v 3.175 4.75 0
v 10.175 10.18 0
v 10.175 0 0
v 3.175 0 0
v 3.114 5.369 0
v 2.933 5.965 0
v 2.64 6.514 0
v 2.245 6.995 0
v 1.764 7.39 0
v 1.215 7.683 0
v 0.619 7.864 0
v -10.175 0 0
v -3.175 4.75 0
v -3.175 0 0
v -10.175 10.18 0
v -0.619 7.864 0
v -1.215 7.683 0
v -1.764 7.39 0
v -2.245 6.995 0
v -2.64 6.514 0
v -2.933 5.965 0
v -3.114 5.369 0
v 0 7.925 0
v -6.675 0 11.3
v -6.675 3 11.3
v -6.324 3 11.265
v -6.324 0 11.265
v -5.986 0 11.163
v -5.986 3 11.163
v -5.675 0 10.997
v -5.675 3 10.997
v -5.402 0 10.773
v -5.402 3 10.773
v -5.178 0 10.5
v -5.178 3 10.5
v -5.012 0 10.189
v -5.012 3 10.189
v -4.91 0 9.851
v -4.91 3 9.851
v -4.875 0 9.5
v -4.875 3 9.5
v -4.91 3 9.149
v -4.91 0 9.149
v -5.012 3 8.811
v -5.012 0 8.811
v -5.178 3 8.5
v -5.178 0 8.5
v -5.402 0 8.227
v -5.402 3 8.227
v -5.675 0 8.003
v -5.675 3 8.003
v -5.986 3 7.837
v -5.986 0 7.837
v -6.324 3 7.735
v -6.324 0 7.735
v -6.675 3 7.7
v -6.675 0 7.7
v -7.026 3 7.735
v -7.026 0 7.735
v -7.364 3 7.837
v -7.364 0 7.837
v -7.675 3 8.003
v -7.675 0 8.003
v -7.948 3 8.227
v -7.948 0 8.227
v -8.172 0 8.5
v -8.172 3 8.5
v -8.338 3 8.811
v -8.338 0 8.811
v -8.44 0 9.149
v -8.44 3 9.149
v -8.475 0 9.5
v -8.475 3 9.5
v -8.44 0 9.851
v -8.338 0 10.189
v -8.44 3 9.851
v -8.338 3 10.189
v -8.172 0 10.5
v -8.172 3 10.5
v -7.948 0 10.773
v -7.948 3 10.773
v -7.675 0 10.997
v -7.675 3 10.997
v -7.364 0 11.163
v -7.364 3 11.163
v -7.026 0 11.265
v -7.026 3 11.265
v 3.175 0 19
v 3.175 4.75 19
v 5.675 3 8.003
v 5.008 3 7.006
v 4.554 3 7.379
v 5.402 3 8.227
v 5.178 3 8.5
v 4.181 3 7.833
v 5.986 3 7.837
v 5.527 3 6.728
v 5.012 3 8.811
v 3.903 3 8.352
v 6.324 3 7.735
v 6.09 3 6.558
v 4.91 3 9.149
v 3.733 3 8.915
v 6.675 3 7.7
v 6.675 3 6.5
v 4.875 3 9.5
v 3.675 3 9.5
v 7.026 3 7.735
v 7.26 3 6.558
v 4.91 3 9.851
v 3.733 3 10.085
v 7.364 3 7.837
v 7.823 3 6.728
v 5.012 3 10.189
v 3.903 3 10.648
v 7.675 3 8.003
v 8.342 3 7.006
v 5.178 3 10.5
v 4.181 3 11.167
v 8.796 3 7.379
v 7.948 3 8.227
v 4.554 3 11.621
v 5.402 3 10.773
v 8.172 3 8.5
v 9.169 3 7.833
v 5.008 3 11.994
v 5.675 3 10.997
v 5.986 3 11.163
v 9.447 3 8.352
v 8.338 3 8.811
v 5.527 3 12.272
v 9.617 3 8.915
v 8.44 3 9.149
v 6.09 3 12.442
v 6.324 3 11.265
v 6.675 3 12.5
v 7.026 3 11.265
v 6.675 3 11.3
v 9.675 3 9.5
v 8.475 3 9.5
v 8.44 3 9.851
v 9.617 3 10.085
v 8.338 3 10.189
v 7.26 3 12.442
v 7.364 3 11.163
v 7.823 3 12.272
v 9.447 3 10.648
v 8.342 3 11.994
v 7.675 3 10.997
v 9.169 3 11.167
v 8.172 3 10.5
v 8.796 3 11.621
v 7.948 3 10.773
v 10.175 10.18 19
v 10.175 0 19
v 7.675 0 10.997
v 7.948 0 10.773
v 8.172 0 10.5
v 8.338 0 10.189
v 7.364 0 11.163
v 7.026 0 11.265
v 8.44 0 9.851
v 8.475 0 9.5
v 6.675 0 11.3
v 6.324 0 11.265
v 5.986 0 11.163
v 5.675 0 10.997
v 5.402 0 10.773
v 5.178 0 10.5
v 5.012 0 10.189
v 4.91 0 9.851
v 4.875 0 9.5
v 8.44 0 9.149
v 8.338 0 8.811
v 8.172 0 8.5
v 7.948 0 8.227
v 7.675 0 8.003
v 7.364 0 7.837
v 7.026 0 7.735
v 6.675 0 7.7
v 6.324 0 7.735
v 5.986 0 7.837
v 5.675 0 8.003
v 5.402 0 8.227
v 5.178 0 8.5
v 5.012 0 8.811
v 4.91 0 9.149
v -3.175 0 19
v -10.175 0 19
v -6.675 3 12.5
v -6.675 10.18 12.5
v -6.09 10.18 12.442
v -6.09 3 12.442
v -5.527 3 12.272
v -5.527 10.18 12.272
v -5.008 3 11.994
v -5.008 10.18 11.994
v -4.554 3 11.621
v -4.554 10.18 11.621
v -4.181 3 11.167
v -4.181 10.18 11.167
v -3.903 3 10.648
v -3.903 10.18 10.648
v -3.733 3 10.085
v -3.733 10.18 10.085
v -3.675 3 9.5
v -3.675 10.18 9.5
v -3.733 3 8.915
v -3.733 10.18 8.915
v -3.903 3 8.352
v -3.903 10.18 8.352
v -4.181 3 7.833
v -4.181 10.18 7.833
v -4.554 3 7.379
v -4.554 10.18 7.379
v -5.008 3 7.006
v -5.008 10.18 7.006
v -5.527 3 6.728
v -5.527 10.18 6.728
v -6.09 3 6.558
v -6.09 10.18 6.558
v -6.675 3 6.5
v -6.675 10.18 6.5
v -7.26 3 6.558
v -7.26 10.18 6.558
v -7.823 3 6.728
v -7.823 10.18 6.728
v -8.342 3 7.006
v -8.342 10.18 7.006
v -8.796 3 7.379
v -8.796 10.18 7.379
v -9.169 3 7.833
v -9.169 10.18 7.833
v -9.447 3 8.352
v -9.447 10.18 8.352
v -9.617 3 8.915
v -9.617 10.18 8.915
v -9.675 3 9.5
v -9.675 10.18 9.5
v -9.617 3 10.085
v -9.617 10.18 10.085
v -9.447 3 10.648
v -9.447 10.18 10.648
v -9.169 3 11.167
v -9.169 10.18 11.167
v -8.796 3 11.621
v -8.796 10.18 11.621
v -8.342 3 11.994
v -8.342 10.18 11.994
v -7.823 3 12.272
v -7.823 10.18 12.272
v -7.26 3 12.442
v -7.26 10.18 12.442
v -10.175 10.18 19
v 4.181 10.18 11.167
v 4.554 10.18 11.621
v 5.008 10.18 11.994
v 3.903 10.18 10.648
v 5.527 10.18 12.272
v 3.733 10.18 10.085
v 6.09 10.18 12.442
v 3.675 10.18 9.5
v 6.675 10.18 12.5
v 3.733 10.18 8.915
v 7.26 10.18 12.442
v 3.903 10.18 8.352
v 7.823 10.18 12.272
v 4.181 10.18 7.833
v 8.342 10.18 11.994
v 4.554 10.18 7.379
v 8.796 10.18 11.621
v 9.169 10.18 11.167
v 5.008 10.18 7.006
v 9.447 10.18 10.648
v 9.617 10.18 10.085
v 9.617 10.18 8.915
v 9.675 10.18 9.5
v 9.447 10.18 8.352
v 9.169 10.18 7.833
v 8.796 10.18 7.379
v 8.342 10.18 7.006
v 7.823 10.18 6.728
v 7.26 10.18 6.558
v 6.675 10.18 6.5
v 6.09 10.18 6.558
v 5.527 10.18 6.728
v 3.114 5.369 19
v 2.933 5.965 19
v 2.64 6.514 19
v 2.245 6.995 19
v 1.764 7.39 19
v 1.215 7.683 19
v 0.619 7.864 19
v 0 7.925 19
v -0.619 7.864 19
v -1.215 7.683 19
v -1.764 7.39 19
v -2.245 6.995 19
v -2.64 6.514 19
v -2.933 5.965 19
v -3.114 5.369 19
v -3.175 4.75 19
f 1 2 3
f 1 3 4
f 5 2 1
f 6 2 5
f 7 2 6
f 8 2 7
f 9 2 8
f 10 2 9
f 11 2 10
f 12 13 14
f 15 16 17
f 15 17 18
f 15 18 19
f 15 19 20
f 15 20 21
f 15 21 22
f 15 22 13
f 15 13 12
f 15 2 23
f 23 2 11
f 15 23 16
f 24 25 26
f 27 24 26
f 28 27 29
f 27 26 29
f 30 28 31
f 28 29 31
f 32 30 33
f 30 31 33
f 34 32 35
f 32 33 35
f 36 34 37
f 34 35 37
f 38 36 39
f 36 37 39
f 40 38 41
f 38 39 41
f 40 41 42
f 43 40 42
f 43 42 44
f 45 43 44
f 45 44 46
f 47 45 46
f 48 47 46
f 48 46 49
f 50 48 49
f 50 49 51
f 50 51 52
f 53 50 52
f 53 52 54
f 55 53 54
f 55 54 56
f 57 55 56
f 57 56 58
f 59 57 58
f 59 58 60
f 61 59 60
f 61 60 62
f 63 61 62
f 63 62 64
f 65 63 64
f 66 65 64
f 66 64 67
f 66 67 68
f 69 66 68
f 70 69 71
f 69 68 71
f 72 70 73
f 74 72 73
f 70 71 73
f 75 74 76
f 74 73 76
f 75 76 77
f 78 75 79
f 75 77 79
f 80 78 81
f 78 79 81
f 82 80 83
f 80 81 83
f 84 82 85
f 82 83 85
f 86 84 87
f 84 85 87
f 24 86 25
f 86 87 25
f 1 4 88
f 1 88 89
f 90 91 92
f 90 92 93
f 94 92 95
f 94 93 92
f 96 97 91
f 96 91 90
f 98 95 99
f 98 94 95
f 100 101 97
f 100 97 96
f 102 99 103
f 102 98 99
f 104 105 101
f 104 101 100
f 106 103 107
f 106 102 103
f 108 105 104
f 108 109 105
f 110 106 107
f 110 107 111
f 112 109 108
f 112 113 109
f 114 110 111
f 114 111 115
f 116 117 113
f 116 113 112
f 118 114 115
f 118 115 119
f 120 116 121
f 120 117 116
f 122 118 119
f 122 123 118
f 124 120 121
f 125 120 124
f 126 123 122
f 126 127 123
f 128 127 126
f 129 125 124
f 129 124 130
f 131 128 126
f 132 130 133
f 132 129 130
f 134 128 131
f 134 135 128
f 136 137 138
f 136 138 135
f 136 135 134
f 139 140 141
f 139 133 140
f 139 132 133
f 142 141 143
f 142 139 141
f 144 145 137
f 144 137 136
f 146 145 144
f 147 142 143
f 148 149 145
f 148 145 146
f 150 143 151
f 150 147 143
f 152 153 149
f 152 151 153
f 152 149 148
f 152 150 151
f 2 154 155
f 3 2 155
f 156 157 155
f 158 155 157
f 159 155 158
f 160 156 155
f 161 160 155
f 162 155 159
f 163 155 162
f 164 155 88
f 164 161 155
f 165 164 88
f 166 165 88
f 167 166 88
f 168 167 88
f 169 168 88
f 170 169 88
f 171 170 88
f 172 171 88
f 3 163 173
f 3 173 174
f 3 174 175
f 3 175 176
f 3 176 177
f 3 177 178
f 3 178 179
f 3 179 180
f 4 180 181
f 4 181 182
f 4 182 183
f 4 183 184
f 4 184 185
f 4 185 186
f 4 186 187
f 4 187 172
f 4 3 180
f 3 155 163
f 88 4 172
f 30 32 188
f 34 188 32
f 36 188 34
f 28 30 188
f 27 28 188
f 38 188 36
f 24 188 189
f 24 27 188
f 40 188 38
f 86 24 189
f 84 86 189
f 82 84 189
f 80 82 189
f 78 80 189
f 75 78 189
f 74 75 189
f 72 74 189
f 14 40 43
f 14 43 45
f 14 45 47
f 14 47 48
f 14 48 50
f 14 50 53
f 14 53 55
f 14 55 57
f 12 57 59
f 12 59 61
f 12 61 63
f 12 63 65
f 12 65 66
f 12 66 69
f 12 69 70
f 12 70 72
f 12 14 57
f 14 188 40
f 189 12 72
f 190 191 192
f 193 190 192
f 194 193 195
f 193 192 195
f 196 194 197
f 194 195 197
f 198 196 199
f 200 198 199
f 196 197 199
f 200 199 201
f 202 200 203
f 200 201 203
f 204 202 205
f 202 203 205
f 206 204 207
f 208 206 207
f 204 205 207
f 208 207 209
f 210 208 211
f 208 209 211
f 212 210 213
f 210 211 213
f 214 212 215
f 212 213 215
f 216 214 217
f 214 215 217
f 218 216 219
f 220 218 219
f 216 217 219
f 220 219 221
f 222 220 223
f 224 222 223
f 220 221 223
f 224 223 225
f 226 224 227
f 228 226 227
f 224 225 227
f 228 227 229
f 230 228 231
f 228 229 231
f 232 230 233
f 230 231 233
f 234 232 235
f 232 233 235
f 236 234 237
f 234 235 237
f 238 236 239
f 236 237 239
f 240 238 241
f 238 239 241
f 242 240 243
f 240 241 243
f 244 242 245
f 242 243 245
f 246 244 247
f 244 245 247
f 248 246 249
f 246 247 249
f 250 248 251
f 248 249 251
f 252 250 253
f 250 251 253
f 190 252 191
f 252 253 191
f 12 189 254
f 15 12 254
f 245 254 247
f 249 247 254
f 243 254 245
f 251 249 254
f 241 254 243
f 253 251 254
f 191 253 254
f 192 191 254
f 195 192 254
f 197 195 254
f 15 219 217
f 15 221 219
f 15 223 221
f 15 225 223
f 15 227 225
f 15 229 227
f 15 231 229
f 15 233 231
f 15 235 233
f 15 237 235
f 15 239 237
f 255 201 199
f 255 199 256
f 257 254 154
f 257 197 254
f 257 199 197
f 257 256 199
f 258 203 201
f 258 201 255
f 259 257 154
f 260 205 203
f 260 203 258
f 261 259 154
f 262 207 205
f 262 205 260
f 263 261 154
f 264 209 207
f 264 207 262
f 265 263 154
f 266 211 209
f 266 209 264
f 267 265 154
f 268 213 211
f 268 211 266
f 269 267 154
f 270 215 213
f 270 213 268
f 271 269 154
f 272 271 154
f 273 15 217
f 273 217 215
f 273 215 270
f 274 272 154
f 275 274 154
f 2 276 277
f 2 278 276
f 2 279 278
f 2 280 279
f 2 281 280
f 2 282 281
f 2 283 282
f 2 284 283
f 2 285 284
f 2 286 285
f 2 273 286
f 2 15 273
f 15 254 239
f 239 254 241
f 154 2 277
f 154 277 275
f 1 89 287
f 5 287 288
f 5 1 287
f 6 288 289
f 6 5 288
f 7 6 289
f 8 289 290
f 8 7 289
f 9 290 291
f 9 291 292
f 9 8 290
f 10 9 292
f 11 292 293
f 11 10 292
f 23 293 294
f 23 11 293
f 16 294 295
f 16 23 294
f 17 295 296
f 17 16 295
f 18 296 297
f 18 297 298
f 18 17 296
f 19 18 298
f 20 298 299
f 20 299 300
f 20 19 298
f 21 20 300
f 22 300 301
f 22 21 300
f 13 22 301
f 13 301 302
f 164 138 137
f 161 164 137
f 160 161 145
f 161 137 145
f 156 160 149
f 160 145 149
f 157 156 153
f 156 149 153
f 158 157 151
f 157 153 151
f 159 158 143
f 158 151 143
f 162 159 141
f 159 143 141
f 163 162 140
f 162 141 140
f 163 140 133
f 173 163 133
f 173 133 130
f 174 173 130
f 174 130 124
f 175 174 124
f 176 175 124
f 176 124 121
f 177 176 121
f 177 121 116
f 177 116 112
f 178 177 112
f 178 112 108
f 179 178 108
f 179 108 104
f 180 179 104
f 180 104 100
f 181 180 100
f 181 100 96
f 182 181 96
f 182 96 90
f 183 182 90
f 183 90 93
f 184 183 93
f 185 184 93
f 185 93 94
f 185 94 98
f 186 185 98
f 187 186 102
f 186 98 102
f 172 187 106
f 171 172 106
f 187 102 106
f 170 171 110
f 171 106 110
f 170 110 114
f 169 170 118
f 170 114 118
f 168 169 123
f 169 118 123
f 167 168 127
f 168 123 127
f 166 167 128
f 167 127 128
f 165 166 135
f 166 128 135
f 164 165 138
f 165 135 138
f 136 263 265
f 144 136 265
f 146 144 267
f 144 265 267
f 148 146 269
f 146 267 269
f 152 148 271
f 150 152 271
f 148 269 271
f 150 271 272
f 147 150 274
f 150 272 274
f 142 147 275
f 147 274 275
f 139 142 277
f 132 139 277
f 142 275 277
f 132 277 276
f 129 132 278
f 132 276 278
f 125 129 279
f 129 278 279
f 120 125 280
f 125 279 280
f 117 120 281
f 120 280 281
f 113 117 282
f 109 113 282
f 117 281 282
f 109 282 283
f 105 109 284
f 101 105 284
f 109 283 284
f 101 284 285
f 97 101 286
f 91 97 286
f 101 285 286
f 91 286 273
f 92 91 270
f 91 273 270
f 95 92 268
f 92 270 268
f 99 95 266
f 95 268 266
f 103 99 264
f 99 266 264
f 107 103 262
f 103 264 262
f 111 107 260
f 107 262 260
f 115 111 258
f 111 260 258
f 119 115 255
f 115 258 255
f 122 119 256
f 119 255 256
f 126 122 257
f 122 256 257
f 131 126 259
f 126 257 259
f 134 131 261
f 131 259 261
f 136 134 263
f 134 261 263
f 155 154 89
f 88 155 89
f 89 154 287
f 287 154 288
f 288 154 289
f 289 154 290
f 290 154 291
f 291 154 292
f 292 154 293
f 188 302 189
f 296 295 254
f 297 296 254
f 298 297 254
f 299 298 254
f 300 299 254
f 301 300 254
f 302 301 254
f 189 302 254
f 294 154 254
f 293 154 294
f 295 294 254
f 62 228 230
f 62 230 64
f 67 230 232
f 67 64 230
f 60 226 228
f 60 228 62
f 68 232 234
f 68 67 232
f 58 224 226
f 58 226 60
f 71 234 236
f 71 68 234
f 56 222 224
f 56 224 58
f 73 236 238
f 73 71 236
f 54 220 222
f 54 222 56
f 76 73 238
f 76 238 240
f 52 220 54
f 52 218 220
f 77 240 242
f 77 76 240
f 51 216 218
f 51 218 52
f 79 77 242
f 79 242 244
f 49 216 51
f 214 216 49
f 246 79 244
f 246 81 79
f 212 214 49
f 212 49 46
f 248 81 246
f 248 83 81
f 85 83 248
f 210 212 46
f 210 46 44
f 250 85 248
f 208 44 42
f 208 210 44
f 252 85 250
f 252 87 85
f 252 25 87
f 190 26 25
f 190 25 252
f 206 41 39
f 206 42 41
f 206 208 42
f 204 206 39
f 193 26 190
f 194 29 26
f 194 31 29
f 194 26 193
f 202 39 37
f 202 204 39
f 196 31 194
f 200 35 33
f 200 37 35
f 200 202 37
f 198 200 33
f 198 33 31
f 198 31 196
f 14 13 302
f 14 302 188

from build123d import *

# Parameters (mm, degrees)
BOSS_EXTRUDE1_DEPTH = 19
SKETCH2_R           = 1.8
CUT_EXTRUDE1_DEPTH  = 24.836170519
SKETCH2_3_R         = 3
SKETCH2_3_R_2       = 1.8
CUT_EXTRUDE2_DEPTH  = 7.18


with BuildPart() as part:
    # Sketch1 → Boss-Extrude1 (new body)
    with BuildSketch(Plane.XY):
        with BuildLine():
            Line((-10.175, 0), (-10.175, 10.18))
            Line((-10.175, 10.18), (10.175, 10.18))
            Line((10.175, 10.18), (10.175, 0))
            Line((10.175, 0), (3.175, 0))
            Line((3.175, 0), (3.175, 4.75))
            ThreePointArc((3.175, 4.75), (0, 7.925), (-3.175, 4.75))
            Line((-3.175, 4.75), (-3.175, 0))
            Line((-3.175, 0), (-10.175, 0))
        make_face()
    extrude(amount=BOSS_EXTRUDE1_DEPTH)

    # Sketch2 → Cut-Extrude1 (cut, through all)
    with BuildSketch(Plane(origin=(0, 10.18, 0), x_dir=(1, 0, 0), z_dir=(0, 1, 0))):
        with Locations(Location((-6.675, -9.5, 0), (0, 0, 270))):
            Circle(SKETCH2_R)
        with Locations(Location((6.675, -9.5, 0), (0, 0, 270))):
            Circle(SKETCH2_R)
    extrude(amount=-CUT_EXTRUDE1_DEPTH, mode=Mode.SUBTRACT)

    # Sketch2<3> → Cut-Extrude2 (cut)
    # profile 1 of 2: a face of its own
    with BuildSketch(Plane(origin=(0, 10.18, 0), x_dir=(1, 0, 0), z_dir=(0, 1, 0))):
        with Locations(Location((-6.675, -9.5, 0), (0, 0, 270))):
            Circle(SKETCH2_3_R)
        with Locations(Location((-6.675, -9.5, 0), (0, 0, 270))):
            Circle(SKETCH2_3_R_2, mode=Mode.SUBTRACT)
    # profile 2 of 2: a face of its own
    with BuildSketch(Plane(origin=(0, 10.18, 0), x_dir=(1, 0, 0), z_dir=(0, 1, 0))):
        with Locations(Location((6.675, -9.5, 0), (0, 0, 270))):
            Circle(SKETCH2_3_R)
    extrude(amount=-CUT_EXTRUDE2_DEPTH, mode=Mode.SUBTRACT)


solid = part.part
